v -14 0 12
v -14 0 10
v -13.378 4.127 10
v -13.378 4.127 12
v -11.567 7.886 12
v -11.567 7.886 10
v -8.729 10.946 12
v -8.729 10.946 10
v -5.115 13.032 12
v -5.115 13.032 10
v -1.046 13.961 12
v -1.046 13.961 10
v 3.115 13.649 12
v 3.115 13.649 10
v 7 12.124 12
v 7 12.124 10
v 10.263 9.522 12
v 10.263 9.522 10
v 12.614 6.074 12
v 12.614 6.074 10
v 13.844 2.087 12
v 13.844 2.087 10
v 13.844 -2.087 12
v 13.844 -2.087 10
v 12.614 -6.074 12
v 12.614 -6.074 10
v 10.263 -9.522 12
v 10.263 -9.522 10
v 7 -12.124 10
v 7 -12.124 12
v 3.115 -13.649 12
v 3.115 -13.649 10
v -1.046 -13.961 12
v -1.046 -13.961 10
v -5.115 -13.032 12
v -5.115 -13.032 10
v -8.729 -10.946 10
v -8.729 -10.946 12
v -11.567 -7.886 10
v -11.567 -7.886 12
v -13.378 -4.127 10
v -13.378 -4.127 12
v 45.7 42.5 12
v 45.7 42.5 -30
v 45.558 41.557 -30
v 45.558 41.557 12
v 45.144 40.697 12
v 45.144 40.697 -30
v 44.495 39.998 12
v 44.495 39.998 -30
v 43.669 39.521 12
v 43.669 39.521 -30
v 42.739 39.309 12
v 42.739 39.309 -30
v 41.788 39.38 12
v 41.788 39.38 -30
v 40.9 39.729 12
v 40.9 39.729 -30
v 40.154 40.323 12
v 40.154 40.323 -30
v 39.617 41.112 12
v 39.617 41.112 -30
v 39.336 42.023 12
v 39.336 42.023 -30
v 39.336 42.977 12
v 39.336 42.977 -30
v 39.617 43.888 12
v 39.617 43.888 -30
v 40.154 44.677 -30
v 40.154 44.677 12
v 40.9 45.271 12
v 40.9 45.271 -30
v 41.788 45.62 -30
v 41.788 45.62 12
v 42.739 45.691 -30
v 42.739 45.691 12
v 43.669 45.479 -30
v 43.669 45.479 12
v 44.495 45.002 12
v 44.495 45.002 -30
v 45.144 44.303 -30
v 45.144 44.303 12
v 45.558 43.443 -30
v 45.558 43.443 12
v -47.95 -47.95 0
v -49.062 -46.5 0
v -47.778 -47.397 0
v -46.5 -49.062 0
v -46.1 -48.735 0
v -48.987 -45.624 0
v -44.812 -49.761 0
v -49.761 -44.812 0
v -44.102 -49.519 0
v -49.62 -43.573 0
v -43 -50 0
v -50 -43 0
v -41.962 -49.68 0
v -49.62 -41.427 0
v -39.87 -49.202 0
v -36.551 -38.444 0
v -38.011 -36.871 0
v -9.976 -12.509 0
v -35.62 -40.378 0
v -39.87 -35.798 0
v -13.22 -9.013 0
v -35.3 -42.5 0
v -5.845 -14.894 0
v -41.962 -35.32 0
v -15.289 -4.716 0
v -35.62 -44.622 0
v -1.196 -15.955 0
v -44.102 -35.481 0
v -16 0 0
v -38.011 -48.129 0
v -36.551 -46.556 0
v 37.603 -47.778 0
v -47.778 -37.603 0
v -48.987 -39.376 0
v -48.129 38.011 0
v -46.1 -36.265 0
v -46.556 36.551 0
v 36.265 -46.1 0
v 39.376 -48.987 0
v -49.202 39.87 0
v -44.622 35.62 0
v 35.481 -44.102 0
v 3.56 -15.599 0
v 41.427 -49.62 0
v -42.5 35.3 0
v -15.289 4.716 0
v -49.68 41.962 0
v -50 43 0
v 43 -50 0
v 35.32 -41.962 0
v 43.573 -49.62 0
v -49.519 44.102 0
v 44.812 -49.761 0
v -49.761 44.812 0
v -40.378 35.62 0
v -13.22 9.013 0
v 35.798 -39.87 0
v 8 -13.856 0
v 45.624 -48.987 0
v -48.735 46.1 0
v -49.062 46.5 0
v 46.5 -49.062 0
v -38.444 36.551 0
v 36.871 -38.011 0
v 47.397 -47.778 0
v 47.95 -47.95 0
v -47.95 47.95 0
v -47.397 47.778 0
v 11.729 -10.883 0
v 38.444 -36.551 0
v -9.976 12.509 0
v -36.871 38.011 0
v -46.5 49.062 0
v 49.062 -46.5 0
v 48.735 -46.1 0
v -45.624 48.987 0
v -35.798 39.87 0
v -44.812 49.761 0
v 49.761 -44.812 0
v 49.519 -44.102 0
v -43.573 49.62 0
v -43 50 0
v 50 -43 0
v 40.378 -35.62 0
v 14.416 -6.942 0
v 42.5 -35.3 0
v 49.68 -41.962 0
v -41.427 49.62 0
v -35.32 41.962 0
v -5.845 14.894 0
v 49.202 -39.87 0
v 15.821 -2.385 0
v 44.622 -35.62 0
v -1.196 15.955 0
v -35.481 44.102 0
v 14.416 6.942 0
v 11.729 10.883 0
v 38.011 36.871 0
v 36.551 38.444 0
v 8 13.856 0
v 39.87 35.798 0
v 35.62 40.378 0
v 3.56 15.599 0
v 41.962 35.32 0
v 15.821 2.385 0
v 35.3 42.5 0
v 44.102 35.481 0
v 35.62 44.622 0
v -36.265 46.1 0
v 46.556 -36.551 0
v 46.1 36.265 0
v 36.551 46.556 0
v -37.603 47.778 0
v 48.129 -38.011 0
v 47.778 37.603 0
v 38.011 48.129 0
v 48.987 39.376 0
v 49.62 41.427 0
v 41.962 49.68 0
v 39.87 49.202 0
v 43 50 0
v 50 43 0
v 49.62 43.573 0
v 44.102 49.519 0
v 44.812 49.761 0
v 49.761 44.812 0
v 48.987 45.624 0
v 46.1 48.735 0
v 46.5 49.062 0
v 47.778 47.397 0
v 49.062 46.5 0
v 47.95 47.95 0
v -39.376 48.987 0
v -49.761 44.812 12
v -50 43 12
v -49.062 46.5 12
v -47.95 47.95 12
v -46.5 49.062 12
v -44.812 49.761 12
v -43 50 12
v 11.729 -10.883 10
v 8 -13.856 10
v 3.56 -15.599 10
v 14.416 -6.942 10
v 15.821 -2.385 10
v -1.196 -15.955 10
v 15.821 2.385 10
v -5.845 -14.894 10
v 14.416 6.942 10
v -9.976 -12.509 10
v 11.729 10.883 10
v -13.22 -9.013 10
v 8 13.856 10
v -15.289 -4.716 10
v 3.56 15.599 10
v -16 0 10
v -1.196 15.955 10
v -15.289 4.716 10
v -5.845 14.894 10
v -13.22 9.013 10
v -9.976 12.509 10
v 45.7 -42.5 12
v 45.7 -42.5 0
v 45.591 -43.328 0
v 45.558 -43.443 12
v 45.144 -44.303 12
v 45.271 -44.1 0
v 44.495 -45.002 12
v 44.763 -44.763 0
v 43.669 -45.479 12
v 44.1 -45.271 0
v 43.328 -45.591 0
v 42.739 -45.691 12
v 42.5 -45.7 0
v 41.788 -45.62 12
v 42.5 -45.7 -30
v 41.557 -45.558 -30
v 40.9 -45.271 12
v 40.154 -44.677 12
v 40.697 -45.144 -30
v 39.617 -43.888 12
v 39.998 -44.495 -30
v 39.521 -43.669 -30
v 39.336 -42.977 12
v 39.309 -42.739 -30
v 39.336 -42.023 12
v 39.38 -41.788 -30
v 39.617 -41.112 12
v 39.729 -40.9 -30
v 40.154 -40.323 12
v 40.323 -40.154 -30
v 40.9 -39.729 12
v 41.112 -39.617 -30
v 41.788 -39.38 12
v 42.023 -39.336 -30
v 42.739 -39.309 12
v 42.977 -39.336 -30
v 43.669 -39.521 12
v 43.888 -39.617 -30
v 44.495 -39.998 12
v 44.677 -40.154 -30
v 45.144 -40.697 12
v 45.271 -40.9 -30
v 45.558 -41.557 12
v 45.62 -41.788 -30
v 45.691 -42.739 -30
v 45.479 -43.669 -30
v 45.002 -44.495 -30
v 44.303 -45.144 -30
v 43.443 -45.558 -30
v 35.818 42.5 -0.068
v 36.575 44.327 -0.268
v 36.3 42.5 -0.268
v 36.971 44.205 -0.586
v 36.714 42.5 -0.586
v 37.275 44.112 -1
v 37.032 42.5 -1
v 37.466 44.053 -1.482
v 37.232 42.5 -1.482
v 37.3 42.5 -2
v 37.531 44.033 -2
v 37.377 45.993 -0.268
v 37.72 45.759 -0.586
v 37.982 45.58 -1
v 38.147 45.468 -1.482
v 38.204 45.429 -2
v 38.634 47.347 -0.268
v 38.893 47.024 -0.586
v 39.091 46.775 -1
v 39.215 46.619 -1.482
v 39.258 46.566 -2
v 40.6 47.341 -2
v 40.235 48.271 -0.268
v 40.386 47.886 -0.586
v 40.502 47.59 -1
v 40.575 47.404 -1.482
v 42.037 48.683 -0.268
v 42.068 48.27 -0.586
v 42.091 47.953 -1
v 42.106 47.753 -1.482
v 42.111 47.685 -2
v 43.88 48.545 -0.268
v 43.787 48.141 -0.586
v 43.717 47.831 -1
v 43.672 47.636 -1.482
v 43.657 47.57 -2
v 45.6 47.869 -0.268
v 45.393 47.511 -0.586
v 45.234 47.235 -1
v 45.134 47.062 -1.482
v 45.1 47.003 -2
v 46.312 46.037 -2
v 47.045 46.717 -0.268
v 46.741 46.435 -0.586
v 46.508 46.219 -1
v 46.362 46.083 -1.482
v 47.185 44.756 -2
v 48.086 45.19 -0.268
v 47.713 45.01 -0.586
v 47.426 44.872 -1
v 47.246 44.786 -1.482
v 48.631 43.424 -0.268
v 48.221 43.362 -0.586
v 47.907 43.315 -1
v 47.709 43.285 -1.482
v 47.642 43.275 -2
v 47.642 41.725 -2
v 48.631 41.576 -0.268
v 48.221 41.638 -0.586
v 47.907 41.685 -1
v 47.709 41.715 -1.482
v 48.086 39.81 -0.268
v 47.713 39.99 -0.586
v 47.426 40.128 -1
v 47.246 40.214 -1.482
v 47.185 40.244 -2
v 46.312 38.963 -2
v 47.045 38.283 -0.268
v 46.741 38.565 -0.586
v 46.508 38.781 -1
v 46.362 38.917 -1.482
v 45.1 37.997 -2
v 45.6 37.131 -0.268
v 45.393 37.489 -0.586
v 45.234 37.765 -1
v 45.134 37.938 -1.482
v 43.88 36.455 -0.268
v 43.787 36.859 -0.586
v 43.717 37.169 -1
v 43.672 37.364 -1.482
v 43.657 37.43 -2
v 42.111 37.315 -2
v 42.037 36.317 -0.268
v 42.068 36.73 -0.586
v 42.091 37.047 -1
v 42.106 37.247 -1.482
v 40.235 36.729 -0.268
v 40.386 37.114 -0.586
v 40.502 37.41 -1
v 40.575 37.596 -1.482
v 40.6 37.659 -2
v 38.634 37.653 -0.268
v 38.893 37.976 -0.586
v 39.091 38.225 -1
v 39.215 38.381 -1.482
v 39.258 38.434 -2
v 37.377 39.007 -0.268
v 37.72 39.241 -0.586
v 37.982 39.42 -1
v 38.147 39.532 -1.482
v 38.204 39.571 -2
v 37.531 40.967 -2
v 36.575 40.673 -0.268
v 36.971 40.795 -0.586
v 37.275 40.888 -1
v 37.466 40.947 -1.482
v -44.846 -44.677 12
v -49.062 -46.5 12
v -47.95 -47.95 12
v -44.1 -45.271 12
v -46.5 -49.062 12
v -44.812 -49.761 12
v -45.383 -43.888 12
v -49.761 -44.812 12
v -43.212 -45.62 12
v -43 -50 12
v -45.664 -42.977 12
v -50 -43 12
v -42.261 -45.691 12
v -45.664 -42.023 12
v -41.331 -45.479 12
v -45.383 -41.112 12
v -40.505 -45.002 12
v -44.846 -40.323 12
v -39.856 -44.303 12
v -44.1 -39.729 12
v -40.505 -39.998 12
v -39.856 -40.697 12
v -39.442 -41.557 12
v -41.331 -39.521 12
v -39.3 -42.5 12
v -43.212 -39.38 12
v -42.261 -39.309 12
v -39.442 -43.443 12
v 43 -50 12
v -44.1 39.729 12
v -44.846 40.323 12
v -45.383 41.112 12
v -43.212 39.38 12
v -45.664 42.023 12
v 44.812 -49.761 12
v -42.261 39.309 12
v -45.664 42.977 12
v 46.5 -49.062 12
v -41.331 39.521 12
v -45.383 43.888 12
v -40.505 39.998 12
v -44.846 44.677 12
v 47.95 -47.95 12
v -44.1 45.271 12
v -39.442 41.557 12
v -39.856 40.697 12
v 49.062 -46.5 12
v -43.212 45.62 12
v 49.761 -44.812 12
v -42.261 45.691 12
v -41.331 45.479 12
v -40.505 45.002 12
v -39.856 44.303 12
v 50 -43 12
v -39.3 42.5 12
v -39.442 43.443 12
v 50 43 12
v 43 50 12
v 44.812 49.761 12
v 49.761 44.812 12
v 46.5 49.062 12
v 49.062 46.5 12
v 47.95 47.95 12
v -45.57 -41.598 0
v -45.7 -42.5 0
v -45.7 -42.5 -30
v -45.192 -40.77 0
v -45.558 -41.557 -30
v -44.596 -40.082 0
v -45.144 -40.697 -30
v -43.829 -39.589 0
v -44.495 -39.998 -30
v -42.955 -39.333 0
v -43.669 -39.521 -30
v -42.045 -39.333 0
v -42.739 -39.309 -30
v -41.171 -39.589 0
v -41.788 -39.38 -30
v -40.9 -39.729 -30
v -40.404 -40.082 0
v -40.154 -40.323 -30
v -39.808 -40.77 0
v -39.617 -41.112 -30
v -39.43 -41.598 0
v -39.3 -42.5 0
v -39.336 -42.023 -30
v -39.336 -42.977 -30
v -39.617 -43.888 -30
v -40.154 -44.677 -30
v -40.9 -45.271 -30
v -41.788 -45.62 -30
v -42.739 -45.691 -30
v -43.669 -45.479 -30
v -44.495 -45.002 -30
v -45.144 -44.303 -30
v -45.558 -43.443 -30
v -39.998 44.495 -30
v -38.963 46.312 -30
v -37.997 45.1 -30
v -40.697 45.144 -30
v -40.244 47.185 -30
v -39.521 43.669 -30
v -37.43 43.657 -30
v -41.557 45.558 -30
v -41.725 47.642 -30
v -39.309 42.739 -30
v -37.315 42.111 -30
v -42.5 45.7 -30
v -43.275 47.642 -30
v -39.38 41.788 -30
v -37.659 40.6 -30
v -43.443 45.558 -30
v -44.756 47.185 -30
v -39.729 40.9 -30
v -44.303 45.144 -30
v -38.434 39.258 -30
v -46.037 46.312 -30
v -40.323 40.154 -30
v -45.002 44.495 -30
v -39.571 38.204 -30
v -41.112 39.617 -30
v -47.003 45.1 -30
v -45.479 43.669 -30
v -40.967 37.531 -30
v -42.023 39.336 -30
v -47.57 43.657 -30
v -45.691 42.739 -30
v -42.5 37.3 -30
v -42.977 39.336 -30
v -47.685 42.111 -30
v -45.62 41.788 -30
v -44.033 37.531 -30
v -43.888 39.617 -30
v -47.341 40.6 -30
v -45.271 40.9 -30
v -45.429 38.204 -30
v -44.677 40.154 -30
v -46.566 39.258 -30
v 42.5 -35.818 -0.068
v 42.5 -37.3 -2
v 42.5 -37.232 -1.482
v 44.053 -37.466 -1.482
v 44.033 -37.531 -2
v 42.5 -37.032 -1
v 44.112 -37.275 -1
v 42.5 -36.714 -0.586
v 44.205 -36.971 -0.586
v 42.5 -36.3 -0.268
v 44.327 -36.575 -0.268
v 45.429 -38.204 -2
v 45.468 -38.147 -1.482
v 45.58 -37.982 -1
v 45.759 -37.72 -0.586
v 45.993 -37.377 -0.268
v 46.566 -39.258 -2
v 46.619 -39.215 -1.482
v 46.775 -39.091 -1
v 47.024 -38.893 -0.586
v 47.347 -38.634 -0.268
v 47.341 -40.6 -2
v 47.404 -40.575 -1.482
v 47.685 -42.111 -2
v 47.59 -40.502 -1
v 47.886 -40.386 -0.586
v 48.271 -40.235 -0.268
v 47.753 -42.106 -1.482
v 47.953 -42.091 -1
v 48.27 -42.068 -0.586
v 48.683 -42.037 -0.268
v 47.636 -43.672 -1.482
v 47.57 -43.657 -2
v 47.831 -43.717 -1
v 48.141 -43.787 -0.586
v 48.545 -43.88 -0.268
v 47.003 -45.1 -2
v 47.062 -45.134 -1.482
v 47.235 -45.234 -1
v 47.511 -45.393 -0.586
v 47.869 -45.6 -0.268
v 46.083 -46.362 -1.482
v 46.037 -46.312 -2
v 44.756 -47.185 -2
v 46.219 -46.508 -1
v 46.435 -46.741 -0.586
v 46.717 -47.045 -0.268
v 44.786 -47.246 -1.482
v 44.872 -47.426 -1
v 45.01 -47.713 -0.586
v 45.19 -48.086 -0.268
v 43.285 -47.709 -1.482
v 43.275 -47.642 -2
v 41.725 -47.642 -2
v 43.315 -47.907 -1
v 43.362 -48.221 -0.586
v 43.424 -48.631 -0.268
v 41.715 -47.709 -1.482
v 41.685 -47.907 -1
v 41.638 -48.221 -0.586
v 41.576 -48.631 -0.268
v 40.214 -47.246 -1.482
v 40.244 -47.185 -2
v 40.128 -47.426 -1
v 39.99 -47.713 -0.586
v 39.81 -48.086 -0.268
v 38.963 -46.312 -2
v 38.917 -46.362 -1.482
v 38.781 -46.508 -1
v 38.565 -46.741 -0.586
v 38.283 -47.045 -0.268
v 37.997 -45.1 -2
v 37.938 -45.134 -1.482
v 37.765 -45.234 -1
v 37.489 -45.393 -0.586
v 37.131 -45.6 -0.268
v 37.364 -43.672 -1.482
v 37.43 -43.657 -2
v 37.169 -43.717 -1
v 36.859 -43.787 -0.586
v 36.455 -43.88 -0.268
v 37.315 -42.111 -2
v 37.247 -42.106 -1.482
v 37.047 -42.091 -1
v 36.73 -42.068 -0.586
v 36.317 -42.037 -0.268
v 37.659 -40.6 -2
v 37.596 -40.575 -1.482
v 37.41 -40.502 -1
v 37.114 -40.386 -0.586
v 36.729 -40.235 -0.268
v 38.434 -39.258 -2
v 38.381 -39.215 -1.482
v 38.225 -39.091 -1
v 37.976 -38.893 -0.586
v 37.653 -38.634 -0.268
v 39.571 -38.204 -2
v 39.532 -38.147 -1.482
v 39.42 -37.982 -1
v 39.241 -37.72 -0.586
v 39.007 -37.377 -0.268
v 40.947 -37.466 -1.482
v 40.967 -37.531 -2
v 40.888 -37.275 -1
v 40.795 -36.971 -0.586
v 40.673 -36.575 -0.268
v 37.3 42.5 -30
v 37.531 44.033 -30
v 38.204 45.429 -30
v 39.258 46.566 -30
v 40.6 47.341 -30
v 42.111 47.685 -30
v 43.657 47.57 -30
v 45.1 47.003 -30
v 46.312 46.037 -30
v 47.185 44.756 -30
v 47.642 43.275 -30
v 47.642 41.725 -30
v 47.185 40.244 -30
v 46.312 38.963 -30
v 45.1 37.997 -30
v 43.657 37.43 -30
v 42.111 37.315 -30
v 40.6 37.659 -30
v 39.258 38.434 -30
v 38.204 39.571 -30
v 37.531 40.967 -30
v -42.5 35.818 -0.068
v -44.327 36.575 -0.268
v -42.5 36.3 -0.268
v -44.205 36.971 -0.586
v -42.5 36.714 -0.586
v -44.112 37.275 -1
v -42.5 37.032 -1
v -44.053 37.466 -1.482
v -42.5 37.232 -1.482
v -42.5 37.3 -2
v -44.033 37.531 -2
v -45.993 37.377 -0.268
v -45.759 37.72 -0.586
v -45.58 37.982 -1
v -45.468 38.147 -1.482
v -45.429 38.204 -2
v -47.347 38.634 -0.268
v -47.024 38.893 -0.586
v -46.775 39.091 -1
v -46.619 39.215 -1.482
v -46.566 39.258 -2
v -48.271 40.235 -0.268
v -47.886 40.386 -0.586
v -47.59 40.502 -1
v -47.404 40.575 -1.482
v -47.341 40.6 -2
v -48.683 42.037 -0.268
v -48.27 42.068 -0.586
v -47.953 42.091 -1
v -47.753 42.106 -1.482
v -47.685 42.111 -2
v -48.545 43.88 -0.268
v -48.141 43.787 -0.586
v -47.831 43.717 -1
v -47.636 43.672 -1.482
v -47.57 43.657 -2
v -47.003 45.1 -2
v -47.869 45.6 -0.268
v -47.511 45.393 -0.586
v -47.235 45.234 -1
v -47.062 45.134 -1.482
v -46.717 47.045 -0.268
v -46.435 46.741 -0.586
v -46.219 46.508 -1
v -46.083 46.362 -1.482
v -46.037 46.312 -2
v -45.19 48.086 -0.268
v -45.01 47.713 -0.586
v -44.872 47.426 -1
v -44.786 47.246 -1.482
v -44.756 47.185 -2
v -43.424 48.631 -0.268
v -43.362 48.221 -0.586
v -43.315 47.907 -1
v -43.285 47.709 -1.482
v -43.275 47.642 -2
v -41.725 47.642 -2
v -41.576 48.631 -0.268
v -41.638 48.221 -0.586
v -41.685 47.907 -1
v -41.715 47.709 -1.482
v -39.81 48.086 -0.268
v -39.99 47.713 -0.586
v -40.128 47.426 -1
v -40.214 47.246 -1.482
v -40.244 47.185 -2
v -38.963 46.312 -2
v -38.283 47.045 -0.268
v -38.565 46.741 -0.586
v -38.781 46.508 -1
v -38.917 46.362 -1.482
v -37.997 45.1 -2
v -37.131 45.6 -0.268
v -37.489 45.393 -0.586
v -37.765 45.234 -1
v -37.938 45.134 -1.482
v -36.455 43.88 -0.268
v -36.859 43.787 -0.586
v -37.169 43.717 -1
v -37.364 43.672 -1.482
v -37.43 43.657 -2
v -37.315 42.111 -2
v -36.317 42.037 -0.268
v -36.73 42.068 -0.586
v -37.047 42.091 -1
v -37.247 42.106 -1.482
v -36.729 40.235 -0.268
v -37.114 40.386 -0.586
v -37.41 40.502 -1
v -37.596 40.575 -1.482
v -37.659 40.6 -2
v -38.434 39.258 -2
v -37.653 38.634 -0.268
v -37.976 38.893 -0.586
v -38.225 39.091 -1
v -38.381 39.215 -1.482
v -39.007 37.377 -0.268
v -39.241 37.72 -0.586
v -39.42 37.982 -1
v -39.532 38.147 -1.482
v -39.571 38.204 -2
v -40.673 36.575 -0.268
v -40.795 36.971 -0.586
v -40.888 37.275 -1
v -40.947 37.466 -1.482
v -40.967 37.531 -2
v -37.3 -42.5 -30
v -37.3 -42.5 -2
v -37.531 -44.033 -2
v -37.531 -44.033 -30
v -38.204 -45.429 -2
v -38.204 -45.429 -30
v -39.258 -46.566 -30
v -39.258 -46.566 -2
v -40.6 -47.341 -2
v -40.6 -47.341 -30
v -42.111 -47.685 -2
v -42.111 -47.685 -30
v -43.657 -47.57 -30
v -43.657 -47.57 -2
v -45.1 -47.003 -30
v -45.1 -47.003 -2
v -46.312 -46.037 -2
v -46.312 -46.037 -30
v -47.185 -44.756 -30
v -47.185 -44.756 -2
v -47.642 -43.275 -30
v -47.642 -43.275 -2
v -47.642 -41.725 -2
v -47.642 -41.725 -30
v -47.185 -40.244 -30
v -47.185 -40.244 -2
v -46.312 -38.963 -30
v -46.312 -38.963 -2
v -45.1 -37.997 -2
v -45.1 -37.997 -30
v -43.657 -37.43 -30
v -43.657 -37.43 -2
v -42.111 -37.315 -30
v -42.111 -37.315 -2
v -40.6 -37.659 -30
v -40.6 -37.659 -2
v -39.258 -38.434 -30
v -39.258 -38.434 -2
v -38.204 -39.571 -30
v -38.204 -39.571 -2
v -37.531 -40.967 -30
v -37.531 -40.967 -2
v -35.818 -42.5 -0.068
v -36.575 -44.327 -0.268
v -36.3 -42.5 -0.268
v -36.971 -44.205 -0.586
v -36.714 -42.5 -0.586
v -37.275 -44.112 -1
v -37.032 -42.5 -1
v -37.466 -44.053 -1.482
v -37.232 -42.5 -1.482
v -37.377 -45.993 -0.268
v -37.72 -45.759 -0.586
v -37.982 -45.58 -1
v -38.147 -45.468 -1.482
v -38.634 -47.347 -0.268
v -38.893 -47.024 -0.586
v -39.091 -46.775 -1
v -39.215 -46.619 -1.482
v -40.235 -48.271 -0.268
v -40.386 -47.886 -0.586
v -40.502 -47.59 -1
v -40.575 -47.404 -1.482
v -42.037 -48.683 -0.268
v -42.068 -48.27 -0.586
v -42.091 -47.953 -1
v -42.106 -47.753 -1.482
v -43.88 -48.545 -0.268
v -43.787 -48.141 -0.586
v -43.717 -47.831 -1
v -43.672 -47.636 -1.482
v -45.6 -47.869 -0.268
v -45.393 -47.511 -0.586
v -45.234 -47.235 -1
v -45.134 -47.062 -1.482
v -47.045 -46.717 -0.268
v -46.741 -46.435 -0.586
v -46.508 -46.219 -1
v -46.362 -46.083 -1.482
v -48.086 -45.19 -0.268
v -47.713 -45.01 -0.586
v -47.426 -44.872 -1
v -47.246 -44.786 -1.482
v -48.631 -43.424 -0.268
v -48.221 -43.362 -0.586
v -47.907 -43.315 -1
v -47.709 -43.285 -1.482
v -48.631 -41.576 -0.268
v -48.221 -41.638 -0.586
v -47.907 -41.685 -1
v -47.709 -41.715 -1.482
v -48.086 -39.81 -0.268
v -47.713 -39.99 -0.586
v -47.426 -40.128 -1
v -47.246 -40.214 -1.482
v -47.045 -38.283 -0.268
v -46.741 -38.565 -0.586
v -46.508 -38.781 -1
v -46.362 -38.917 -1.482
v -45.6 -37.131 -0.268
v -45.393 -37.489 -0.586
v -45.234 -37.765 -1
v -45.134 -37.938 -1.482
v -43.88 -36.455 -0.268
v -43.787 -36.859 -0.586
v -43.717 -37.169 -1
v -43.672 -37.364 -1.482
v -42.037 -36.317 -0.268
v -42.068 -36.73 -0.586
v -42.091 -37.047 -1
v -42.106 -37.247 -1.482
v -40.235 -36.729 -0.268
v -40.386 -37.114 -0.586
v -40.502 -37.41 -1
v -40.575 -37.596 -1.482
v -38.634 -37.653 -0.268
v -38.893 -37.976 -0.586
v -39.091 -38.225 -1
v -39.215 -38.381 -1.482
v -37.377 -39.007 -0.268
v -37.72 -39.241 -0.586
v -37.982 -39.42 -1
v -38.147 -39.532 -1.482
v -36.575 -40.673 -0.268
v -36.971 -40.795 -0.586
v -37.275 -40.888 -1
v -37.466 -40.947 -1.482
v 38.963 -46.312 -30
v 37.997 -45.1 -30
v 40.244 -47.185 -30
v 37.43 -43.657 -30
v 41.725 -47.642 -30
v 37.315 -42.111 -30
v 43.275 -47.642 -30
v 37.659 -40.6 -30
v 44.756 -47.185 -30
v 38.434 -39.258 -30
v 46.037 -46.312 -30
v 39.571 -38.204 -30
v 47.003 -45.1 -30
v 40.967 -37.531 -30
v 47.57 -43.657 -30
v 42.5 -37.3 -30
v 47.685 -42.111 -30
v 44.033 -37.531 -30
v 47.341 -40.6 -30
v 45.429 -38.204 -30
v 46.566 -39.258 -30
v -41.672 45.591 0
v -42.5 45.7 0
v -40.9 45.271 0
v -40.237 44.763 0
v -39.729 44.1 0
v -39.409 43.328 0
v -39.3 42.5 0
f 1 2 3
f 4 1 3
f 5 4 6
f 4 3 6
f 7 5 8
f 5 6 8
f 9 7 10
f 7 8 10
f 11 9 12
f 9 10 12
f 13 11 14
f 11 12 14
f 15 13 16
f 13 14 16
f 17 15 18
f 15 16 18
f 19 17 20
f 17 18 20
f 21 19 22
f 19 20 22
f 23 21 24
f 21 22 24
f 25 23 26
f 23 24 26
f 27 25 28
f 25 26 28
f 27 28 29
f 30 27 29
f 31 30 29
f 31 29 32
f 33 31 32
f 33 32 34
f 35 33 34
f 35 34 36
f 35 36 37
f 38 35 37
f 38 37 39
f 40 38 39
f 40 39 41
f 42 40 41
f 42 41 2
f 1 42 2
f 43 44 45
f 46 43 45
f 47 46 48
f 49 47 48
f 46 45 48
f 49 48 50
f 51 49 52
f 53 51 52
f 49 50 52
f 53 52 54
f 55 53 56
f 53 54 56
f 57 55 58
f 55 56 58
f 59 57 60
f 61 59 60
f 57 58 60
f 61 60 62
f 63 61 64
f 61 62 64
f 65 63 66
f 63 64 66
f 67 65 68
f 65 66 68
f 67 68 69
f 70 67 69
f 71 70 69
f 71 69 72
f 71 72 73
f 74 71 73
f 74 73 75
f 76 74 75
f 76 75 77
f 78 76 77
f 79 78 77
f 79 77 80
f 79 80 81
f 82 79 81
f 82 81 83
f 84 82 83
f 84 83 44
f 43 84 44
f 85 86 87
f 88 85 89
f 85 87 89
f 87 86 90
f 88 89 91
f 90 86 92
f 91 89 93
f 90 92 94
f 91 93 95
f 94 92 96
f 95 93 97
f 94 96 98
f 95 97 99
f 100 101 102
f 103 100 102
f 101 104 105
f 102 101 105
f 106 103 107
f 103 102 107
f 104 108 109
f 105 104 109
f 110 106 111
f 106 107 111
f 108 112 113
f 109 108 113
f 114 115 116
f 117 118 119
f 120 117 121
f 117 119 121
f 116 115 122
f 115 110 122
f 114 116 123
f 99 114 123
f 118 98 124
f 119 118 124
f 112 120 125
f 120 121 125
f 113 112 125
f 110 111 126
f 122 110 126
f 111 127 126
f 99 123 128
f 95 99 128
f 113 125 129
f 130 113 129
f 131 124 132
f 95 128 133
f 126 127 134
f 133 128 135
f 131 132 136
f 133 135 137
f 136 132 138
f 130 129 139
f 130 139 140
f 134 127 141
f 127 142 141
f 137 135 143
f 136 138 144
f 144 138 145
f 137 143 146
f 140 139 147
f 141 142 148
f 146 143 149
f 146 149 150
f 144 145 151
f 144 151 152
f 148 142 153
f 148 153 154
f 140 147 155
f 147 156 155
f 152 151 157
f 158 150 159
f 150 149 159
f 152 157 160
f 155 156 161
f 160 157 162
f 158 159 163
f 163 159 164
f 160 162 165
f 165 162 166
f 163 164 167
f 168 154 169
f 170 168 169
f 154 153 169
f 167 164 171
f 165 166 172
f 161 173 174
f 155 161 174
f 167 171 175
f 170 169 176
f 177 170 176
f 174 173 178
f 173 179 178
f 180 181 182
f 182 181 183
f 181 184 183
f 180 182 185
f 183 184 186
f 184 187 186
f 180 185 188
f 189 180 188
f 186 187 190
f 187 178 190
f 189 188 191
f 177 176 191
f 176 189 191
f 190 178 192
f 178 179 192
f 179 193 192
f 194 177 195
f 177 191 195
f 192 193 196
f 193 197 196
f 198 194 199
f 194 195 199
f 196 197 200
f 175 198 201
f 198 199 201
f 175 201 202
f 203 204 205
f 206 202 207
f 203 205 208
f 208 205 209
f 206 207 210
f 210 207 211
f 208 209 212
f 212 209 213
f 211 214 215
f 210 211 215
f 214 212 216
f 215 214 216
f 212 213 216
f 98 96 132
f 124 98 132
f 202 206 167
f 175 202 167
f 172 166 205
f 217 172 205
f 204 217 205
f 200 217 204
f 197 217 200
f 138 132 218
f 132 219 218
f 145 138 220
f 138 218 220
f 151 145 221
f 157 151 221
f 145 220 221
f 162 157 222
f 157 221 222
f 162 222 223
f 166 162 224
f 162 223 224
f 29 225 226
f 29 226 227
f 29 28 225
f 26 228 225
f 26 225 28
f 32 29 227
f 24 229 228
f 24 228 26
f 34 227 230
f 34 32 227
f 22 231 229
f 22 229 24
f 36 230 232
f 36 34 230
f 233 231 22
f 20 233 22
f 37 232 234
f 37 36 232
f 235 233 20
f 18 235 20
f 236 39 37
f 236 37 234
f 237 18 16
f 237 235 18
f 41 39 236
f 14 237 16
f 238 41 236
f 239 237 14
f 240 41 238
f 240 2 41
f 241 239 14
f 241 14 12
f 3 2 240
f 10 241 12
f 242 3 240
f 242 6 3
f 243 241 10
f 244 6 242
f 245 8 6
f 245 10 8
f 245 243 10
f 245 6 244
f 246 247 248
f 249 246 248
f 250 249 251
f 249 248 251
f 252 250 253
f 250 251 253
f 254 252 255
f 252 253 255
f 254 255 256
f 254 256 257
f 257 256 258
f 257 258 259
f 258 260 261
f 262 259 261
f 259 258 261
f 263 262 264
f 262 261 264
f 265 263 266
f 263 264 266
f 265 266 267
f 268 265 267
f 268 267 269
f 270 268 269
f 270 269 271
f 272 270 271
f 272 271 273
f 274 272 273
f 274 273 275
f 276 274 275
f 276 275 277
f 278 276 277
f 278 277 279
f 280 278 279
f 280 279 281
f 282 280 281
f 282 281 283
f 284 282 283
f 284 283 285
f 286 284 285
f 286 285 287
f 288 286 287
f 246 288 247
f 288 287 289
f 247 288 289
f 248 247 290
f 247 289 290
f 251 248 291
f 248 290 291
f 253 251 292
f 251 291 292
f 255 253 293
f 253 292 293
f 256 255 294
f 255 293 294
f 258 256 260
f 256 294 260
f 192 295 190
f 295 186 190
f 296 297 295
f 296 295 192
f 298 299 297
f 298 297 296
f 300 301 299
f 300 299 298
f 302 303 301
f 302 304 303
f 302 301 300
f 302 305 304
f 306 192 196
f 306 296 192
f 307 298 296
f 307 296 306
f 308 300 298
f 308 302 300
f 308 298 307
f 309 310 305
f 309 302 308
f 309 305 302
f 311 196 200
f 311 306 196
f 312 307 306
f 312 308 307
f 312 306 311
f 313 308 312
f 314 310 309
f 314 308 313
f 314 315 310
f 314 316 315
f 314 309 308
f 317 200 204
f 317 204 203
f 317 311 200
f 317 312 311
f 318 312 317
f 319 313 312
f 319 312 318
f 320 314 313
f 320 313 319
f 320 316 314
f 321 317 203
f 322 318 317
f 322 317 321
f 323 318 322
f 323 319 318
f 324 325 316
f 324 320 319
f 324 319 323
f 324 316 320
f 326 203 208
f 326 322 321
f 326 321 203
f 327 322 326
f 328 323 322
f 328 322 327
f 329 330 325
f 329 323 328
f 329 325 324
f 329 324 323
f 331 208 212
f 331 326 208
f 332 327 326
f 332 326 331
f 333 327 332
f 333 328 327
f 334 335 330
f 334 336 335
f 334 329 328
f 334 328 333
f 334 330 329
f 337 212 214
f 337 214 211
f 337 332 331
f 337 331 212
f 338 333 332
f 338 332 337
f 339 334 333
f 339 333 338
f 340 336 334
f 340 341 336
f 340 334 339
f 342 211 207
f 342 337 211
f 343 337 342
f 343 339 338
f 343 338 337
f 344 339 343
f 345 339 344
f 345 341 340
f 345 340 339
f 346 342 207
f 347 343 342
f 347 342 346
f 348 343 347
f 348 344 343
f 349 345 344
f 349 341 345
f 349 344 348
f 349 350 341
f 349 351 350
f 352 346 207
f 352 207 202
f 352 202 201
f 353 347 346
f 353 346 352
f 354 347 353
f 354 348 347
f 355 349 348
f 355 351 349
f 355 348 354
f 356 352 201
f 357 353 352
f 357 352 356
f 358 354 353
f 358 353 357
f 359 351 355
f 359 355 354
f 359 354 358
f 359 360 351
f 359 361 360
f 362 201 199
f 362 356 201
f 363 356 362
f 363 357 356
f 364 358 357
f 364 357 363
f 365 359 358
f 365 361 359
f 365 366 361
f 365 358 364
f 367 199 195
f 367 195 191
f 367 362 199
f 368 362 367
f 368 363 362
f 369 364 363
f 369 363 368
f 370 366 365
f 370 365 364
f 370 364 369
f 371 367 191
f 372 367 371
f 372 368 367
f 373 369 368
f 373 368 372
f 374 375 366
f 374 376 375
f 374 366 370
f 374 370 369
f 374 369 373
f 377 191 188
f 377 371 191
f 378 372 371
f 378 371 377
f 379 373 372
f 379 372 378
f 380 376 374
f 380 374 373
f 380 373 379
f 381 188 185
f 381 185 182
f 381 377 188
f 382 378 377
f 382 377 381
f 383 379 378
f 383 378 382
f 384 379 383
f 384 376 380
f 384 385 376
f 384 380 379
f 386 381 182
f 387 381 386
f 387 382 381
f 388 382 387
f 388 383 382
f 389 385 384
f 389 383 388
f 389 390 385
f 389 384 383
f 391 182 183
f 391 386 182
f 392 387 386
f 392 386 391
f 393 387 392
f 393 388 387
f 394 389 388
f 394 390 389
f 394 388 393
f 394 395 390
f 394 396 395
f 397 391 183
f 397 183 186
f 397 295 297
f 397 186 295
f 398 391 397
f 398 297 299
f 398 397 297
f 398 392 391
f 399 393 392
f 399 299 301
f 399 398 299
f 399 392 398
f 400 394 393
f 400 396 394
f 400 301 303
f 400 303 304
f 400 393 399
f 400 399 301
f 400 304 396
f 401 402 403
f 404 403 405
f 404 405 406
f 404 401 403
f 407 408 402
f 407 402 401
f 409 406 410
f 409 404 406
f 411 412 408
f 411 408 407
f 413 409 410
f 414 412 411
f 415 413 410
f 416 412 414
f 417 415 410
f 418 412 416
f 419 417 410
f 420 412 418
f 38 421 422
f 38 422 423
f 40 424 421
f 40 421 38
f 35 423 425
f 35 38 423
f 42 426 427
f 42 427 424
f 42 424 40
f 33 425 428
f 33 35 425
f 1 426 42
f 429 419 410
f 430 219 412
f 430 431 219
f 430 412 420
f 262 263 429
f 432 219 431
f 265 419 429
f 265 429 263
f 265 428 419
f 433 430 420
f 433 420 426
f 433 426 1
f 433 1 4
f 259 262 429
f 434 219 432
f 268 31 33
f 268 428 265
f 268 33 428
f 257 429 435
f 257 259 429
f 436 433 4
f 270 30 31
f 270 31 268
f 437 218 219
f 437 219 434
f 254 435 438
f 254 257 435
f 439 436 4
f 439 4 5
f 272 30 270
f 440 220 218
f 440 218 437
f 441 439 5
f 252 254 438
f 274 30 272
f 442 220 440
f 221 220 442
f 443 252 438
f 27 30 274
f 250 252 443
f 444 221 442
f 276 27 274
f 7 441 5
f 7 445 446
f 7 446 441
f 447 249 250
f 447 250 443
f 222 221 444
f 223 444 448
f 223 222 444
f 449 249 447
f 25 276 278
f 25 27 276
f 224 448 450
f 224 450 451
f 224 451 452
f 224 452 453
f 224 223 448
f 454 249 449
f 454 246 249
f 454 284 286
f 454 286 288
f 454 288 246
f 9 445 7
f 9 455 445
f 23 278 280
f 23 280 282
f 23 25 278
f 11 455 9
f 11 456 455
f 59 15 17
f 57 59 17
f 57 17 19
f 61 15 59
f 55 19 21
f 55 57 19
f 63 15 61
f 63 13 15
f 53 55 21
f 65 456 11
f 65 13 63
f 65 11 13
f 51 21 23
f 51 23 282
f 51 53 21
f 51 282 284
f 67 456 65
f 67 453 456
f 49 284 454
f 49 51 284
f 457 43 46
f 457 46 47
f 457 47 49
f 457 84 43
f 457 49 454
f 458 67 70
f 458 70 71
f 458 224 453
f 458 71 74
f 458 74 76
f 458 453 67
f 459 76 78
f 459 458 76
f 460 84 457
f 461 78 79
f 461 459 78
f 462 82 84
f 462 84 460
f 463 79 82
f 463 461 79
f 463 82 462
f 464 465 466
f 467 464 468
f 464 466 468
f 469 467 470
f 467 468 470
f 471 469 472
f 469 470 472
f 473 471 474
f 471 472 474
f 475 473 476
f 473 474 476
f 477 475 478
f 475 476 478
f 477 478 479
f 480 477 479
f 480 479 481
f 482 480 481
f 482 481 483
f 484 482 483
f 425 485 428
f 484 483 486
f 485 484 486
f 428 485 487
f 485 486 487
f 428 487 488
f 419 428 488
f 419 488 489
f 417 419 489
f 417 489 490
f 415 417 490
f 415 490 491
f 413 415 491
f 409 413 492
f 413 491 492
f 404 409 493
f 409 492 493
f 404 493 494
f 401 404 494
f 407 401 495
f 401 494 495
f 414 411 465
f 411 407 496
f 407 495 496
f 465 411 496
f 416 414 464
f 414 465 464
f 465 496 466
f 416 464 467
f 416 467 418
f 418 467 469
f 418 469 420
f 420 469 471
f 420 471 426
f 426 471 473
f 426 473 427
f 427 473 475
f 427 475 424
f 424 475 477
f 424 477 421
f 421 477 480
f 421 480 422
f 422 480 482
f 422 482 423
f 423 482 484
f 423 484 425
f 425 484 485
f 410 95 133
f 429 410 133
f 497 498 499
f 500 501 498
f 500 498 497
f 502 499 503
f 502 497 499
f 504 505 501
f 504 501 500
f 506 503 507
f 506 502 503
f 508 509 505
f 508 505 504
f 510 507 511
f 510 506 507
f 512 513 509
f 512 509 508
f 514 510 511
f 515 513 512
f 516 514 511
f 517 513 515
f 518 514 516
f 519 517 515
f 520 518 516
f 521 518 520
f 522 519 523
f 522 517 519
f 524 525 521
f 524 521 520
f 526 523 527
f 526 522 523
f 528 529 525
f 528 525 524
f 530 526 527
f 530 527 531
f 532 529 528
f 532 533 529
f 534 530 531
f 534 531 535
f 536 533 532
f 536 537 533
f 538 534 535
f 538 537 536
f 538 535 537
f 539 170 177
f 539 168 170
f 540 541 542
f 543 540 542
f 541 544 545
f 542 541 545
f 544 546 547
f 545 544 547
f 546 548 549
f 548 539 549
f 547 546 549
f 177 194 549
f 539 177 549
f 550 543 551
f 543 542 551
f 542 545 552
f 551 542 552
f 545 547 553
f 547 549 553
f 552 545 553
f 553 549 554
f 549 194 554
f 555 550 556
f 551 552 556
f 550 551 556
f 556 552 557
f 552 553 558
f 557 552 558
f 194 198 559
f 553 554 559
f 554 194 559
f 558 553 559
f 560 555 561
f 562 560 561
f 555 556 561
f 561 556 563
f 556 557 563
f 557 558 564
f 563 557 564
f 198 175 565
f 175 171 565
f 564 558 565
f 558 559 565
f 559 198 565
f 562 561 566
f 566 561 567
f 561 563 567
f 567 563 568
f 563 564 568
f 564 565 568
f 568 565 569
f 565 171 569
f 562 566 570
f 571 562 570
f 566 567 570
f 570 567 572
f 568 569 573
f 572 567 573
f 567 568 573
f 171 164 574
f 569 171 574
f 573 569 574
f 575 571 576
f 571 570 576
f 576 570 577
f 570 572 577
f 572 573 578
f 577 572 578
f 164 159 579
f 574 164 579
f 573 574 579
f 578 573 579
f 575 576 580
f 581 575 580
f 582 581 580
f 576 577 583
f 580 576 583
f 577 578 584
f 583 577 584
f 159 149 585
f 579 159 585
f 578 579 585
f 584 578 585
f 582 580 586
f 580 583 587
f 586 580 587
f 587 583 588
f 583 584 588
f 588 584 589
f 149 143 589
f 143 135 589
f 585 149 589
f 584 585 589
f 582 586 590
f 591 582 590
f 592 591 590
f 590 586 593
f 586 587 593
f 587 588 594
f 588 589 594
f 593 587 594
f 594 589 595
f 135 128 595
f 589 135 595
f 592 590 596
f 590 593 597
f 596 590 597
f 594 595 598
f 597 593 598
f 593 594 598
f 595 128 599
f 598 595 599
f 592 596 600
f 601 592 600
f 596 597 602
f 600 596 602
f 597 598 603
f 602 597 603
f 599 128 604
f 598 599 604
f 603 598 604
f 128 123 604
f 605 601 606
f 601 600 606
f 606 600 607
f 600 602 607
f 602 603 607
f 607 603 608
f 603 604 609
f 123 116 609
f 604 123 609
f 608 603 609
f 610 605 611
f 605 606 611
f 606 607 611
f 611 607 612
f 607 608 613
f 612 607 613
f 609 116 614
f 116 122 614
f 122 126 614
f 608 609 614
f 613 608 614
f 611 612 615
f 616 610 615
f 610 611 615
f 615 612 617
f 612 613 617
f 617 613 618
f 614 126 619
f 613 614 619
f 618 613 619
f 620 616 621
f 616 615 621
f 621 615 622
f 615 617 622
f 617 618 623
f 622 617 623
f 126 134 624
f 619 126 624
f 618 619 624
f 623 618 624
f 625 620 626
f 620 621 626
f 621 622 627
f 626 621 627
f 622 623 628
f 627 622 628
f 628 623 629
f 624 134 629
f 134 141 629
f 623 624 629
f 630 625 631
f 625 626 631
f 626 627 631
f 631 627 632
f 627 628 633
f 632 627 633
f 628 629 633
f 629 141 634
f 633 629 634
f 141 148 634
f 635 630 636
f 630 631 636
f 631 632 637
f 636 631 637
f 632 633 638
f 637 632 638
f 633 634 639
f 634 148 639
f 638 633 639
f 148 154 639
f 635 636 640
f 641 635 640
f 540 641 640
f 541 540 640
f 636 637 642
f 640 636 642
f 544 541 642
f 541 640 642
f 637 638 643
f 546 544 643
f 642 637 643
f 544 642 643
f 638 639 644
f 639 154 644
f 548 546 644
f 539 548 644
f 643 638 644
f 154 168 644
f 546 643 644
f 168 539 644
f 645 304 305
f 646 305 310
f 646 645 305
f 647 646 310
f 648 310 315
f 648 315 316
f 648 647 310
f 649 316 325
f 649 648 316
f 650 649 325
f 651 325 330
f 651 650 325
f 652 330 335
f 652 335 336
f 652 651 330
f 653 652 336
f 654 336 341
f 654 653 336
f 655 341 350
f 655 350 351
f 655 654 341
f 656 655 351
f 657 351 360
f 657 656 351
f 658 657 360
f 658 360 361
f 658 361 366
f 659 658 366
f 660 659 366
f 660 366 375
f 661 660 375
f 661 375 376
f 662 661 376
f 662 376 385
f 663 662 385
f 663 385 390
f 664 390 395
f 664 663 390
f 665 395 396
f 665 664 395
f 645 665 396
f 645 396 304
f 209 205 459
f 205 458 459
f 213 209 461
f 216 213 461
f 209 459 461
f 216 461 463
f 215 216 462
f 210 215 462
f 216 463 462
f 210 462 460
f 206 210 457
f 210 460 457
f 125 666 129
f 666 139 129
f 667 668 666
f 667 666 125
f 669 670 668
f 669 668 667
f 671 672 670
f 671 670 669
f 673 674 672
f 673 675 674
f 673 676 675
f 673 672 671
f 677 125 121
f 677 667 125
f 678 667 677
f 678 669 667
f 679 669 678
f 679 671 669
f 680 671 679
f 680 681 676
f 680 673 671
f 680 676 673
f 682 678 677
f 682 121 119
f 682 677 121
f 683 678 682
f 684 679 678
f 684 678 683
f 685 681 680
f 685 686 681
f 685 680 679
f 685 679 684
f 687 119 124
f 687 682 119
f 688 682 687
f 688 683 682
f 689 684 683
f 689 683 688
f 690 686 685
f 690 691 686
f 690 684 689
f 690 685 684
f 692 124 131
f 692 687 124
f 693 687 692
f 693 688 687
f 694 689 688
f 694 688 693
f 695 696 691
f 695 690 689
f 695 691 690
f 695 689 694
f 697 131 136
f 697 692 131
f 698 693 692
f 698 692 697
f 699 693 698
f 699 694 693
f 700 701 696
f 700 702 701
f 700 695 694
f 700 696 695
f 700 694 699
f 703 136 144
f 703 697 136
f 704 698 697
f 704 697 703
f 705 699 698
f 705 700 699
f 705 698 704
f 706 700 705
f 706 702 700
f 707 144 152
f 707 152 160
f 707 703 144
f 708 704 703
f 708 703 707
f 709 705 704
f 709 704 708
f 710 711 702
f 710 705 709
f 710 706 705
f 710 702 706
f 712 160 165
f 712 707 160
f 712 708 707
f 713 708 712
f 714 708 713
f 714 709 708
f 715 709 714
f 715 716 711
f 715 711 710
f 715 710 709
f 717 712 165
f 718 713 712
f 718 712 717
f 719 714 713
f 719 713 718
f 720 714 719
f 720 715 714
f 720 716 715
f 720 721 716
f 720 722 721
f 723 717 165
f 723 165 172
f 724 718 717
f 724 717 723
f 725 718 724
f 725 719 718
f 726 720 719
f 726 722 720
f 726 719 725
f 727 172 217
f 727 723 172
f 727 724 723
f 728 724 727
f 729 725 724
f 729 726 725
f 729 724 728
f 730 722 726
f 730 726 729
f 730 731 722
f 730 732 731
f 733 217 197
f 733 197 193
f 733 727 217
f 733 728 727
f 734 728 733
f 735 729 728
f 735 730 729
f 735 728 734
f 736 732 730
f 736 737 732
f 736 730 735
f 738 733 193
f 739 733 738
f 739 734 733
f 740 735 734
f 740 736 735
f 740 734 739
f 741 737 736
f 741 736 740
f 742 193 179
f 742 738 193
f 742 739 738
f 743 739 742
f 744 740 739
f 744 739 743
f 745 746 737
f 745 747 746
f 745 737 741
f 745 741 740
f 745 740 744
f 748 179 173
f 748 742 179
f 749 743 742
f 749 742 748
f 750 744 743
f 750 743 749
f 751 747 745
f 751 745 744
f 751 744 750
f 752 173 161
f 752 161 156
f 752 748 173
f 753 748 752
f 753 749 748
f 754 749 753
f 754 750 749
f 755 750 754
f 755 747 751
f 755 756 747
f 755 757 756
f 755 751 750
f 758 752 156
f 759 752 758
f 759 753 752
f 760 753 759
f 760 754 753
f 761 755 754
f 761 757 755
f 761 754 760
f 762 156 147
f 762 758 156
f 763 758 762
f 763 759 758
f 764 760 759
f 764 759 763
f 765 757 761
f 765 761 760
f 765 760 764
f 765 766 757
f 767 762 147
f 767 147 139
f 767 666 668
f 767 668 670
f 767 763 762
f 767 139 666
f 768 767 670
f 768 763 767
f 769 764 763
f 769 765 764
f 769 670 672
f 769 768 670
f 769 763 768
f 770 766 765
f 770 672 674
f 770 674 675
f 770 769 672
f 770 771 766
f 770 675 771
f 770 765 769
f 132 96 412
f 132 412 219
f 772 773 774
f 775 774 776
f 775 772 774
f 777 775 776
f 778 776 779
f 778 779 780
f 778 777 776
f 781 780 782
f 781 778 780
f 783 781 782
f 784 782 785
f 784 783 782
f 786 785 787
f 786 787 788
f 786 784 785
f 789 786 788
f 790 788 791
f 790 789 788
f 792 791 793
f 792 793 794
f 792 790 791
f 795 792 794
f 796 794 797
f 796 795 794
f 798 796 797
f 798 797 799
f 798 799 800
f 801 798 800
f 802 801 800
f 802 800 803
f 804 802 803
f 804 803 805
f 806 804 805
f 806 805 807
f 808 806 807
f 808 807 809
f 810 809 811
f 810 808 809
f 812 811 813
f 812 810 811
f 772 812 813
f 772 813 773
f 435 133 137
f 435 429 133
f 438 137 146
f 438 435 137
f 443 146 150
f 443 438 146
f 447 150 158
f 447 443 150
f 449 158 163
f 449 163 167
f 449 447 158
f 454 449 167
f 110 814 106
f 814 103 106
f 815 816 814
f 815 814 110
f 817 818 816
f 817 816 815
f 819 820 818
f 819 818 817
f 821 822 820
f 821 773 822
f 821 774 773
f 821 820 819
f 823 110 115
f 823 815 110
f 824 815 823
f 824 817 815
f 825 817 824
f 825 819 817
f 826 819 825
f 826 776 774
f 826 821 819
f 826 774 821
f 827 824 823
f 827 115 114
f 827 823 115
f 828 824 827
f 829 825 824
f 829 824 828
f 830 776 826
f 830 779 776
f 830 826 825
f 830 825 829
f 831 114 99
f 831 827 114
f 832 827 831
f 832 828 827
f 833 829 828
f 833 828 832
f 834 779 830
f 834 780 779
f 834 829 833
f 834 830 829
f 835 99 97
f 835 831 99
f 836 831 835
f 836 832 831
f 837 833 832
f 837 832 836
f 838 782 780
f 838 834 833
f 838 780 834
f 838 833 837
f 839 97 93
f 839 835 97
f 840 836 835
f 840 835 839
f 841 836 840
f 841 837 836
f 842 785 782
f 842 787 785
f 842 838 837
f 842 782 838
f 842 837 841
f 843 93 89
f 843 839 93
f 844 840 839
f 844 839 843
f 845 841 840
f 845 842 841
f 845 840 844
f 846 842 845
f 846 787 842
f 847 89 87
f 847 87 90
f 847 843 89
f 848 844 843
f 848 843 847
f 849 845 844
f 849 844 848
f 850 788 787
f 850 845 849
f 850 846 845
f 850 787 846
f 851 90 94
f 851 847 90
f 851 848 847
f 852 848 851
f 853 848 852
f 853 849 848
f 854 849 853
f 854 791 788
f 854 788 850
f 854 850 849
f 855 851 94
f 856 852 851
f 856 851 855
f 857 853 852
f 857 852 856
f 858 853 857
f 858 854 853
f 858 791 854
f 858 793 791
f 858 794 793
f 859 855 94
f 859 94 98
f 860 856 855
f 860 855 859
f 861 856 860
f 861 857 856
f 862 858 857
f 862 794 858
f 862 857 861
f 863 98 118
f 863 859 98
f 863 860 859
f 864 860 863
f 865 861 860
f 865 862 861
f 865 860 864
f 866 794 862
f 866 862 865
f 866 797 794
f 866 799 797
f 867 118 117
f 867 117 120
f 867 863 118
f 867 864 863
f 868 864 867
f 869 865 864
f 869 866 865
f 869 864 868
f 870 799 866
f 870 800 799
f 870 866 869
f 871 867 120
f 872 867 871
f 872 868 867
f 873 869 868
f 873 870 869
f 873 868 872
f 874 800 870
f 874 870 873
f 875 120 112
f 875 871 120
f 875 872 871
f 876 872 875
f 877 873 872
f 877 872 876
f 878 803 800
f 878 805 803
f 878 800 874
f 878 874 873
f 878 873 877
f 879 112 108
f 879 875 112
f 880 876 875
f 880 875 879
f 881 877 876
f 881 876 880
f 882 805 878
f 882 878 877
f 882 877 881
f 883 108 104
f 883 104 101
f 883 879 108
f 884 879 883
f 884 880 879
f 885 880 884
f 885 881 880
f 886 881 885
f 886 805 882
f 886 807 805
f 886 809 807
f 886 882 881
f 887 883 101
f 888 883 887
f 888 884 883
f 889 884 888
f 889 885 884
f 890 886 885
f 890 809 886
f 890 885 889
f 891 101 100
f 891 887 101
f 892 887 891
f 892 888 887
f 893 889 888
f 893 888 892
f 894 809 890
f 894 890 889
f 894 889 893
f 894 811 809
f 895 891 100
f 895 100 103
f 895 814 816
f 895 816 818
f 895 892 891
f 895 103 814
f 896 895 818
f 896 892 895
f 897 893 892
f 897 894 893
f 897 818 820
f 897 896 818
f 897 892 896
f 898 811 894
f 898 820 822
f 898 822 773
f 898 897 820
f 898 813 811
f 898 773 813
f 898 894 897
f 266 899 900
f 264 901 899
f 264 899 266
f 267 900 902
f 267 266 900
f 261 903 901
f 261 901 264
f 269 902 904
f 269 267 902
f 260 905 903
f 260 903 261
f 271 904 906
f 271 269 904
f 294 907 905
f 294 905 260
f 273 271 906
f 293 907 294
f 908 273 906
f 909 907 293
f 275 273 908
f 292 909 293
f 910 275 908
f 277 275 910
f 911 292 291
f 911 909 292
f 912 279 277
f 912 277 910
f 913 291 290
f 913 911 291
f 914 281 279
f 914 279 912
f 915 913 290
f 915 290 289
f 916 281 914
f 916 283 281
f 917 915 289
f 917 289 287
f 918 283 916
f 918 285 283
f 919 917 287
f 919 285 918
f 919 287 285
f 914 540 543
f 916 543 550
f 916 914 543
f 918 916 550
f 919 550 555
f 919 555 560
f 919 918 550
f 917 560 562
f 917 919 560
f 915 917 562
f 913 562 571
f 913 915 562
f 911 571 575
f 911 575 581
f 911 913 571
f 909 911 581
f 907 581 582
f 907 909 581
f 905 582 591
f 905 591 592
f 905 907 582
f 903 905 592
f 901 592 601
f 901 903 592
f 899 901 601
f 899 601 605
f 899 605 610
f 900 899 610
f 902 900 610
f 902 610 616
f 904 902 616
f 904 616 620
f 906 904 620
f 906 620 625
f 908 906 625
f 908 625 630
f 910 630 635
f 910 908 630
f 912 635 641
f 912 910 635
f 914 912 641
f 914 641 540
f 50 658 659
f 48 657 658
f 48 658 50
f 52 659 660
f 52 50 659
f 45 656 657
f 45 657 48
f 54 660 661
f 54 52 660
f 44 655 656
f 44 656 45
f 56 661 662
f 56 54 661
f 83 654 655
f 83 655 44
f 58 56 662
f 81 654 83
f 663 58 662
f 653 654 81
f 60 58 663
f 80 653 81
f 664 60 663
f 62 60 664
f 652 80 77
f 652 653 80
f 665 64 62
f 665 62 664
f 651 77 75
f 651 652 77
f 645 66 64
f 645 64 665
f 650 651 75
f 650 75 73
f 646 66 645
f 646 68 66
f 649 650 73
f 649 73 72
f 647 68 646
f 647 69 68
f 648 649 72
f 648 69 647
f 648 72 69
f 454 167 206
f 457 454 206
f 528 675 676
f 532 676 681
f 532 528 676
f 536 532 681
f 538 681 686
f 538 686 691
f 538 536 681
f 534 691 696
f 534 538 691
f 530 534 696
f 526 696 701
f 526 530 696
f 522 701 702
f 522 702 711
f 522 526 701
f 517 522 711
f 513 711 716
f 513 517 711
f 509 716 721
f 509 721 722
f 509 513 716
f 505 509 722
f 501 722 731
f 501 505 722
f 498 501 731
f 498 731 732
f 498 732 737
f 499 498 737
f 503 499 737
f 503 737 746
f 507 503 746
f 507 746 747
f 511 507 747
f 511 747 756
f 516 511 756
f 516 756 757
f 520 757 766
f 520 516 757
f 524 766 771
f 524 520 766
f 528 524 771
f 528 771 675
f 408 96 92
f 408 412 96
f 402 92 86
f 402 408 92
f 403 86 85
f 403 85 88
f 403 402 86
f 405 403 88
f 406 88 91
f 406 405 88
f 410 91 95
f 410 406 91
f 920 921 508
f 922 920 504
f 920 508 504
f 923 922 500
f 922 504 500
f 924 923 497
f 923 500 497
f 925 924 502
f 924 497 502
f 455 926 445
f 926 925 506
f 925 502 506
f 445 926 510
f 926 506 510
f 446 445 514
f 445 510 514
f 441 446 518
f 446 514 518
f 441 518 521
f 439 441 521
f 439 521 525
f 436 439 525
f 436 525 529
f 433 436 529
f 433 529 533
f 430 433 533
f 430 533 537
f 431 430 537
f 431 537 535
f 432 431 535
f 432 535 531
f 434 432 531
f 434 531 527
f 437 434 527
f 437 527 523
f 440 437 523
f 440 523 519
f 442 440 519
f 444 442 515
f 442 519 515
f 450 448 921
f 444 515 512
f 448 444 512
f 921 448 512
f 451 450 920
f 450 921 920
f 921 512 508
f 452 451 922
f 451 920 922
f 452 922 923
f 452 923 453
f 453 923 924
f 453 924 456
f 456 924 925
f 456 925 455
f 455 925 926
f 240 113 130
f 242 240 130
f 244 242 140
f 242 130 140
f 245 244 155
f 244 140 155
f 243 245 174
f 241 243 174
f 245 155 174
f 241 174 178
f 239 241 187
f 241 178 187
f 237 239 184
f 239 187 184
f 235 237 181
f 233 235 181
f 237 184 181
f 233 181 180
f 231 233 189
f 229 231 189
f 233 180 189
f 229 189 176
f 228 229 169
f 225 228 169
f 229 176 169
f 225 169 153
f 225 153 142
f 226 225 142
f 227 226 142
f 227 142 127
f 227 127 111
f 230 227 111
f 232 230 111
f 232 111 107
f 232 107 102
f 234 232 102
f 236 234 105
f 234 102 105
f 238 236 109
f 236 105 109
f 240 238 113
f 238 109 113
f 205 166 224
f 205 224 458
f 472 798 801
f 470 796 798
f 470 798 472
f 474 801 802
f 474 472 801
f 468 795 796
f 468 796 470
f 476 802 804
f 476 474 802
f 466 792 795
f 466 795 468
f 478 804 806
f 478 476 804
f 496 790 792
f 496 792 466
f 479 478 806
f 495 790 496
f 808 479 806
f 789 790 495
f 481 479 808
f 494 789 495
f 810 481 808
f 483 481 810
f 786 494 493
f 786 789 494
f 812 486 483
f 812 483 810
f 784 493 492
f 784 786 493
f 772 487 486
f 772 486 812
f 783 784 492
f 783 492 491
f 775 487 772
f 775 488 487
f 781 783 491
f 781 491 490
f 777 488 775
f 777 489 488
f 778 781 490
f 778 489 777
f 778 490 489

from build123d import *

# Parameters (mm, degrees)
SKETCH2_W            = 100
SKETCH2_H            = 100
BOSS_EXTRUDE1_DEPTH  = 12
SKETCH3_R            = 16
CUT_EXTRUDE1_DEPTH   = 10
M6_CLEARANCE_HOLE1_D = 6.4
BOSS_EXTRUDE2_START  = 30
SKETCH17_R           = 5.2
SKETCH17_R_2         = 3.2
BOSS_EXTRUDE2_DEPTH  = 30
CIRPATTERN1_COUNT    = 4
SKETCH18_R           = 14
CUT_EXTRUDE3_DEPTH   = 77.811457479
FILLET1_R            = 2
FILLET2_R            = 7


with BuildPart() as part:
    # Sketch2 → Boss-Extrude1 (new body)
    with BuildSketch(Plane.XY):
        Rectangle(SKETCH2_W, SKETCH2_H)
    extrude(amount=BOSS_EXTRUDE1_DEPTH)

    # Sketch3 → Cut-Extrude1 (cut)
    with BuildSketch(Plane(origin=(0, 0, 0), x_dir=(-1, 0, 0), z_dir=(0, 0, -1))):
        Circle(SKETCH3_R)
    extrude(amount=-CUT_EXTRUDE1_DEPTH, mode=Mode.SUBTRACT)

    # M6 Clearance Hole1 (through all)
    with Locations(Plane(origin=(0, 0, 12), x_dir=(-1, 0, 0), z_dir=(0, 0, 1))):
        with Locations((42.5, -42.5), (-42.5, 42.5), (-42.5, -42.5), (42.5, 42.5)):
            Hole(M6_CLEARANCE_HOLE1_D / 2)

    # Sketch17 → Boss-Extrude2 (add)
    with BuildSketch(Plane(origin=(0, 0, 0), x_dir=(-1, 0, 0), z_dir=(0, 0, -1)).offset(BOSS_EXTRUDE2_START)):
        with Locations((-42.5, 42.5)):
            Circle(SKETCH17_R)
        with Locations(Location((-42.5, 42.5, 0), (0, 0, 180))):
            Circle(SKETCH17_R_2, mode=Mode.SUBTRACT)
    boss_extrude2 = extrude(amount=-BOSS_EXTRUDE2_DEPTH)

    # CirPattern1: Boss-Extrude2 ×4 about axis
    cirpattern1_axis = Axis((0, 0, 0), (0, 0, 1))
    for i in range(1, CIRPATTERN1_COUNT):
        add(boss_extrude2.rotate(cirpattern1_axis, i * 360 / CIRPATTERN1_COUNT))

    # Sketch18 → Cut-Extrude3 (cut, through all)
    with BuildSketch(Plane(origin=(0, 0, 0), x_dir=(-1, 0, 0), z_dir=(0, 0, -1))):
        Circle(SKETCH18_R)
    extrude(amount=-CUT_EXTRUDE3_DEPTH, mode=Mode.SUBTRACT)

    # Fillet1
    fillet1_edges = [part.edges().sort_by_distance(p)[0] for p in [
        (47.7, 42.5, 0),
        (-42.5, 47.7, 0),
        (-47.7, -42.5, 0),
        (42.5, -47.7, 0),
    ]]
    fillet(fillet1_edges, radius=FILLET1_R)

    # Fillet2
    fillet2_edges = [part.edges().sort_by_distance(p)[0] for p in [
        (50, -50, 6),
        (-50, -50, 6),
        (-50, 50, 6),
        (50, 50, 6),
    ]]
    fillet(fillet2_edges, radius=FILLET2_R)


solid = part.part
